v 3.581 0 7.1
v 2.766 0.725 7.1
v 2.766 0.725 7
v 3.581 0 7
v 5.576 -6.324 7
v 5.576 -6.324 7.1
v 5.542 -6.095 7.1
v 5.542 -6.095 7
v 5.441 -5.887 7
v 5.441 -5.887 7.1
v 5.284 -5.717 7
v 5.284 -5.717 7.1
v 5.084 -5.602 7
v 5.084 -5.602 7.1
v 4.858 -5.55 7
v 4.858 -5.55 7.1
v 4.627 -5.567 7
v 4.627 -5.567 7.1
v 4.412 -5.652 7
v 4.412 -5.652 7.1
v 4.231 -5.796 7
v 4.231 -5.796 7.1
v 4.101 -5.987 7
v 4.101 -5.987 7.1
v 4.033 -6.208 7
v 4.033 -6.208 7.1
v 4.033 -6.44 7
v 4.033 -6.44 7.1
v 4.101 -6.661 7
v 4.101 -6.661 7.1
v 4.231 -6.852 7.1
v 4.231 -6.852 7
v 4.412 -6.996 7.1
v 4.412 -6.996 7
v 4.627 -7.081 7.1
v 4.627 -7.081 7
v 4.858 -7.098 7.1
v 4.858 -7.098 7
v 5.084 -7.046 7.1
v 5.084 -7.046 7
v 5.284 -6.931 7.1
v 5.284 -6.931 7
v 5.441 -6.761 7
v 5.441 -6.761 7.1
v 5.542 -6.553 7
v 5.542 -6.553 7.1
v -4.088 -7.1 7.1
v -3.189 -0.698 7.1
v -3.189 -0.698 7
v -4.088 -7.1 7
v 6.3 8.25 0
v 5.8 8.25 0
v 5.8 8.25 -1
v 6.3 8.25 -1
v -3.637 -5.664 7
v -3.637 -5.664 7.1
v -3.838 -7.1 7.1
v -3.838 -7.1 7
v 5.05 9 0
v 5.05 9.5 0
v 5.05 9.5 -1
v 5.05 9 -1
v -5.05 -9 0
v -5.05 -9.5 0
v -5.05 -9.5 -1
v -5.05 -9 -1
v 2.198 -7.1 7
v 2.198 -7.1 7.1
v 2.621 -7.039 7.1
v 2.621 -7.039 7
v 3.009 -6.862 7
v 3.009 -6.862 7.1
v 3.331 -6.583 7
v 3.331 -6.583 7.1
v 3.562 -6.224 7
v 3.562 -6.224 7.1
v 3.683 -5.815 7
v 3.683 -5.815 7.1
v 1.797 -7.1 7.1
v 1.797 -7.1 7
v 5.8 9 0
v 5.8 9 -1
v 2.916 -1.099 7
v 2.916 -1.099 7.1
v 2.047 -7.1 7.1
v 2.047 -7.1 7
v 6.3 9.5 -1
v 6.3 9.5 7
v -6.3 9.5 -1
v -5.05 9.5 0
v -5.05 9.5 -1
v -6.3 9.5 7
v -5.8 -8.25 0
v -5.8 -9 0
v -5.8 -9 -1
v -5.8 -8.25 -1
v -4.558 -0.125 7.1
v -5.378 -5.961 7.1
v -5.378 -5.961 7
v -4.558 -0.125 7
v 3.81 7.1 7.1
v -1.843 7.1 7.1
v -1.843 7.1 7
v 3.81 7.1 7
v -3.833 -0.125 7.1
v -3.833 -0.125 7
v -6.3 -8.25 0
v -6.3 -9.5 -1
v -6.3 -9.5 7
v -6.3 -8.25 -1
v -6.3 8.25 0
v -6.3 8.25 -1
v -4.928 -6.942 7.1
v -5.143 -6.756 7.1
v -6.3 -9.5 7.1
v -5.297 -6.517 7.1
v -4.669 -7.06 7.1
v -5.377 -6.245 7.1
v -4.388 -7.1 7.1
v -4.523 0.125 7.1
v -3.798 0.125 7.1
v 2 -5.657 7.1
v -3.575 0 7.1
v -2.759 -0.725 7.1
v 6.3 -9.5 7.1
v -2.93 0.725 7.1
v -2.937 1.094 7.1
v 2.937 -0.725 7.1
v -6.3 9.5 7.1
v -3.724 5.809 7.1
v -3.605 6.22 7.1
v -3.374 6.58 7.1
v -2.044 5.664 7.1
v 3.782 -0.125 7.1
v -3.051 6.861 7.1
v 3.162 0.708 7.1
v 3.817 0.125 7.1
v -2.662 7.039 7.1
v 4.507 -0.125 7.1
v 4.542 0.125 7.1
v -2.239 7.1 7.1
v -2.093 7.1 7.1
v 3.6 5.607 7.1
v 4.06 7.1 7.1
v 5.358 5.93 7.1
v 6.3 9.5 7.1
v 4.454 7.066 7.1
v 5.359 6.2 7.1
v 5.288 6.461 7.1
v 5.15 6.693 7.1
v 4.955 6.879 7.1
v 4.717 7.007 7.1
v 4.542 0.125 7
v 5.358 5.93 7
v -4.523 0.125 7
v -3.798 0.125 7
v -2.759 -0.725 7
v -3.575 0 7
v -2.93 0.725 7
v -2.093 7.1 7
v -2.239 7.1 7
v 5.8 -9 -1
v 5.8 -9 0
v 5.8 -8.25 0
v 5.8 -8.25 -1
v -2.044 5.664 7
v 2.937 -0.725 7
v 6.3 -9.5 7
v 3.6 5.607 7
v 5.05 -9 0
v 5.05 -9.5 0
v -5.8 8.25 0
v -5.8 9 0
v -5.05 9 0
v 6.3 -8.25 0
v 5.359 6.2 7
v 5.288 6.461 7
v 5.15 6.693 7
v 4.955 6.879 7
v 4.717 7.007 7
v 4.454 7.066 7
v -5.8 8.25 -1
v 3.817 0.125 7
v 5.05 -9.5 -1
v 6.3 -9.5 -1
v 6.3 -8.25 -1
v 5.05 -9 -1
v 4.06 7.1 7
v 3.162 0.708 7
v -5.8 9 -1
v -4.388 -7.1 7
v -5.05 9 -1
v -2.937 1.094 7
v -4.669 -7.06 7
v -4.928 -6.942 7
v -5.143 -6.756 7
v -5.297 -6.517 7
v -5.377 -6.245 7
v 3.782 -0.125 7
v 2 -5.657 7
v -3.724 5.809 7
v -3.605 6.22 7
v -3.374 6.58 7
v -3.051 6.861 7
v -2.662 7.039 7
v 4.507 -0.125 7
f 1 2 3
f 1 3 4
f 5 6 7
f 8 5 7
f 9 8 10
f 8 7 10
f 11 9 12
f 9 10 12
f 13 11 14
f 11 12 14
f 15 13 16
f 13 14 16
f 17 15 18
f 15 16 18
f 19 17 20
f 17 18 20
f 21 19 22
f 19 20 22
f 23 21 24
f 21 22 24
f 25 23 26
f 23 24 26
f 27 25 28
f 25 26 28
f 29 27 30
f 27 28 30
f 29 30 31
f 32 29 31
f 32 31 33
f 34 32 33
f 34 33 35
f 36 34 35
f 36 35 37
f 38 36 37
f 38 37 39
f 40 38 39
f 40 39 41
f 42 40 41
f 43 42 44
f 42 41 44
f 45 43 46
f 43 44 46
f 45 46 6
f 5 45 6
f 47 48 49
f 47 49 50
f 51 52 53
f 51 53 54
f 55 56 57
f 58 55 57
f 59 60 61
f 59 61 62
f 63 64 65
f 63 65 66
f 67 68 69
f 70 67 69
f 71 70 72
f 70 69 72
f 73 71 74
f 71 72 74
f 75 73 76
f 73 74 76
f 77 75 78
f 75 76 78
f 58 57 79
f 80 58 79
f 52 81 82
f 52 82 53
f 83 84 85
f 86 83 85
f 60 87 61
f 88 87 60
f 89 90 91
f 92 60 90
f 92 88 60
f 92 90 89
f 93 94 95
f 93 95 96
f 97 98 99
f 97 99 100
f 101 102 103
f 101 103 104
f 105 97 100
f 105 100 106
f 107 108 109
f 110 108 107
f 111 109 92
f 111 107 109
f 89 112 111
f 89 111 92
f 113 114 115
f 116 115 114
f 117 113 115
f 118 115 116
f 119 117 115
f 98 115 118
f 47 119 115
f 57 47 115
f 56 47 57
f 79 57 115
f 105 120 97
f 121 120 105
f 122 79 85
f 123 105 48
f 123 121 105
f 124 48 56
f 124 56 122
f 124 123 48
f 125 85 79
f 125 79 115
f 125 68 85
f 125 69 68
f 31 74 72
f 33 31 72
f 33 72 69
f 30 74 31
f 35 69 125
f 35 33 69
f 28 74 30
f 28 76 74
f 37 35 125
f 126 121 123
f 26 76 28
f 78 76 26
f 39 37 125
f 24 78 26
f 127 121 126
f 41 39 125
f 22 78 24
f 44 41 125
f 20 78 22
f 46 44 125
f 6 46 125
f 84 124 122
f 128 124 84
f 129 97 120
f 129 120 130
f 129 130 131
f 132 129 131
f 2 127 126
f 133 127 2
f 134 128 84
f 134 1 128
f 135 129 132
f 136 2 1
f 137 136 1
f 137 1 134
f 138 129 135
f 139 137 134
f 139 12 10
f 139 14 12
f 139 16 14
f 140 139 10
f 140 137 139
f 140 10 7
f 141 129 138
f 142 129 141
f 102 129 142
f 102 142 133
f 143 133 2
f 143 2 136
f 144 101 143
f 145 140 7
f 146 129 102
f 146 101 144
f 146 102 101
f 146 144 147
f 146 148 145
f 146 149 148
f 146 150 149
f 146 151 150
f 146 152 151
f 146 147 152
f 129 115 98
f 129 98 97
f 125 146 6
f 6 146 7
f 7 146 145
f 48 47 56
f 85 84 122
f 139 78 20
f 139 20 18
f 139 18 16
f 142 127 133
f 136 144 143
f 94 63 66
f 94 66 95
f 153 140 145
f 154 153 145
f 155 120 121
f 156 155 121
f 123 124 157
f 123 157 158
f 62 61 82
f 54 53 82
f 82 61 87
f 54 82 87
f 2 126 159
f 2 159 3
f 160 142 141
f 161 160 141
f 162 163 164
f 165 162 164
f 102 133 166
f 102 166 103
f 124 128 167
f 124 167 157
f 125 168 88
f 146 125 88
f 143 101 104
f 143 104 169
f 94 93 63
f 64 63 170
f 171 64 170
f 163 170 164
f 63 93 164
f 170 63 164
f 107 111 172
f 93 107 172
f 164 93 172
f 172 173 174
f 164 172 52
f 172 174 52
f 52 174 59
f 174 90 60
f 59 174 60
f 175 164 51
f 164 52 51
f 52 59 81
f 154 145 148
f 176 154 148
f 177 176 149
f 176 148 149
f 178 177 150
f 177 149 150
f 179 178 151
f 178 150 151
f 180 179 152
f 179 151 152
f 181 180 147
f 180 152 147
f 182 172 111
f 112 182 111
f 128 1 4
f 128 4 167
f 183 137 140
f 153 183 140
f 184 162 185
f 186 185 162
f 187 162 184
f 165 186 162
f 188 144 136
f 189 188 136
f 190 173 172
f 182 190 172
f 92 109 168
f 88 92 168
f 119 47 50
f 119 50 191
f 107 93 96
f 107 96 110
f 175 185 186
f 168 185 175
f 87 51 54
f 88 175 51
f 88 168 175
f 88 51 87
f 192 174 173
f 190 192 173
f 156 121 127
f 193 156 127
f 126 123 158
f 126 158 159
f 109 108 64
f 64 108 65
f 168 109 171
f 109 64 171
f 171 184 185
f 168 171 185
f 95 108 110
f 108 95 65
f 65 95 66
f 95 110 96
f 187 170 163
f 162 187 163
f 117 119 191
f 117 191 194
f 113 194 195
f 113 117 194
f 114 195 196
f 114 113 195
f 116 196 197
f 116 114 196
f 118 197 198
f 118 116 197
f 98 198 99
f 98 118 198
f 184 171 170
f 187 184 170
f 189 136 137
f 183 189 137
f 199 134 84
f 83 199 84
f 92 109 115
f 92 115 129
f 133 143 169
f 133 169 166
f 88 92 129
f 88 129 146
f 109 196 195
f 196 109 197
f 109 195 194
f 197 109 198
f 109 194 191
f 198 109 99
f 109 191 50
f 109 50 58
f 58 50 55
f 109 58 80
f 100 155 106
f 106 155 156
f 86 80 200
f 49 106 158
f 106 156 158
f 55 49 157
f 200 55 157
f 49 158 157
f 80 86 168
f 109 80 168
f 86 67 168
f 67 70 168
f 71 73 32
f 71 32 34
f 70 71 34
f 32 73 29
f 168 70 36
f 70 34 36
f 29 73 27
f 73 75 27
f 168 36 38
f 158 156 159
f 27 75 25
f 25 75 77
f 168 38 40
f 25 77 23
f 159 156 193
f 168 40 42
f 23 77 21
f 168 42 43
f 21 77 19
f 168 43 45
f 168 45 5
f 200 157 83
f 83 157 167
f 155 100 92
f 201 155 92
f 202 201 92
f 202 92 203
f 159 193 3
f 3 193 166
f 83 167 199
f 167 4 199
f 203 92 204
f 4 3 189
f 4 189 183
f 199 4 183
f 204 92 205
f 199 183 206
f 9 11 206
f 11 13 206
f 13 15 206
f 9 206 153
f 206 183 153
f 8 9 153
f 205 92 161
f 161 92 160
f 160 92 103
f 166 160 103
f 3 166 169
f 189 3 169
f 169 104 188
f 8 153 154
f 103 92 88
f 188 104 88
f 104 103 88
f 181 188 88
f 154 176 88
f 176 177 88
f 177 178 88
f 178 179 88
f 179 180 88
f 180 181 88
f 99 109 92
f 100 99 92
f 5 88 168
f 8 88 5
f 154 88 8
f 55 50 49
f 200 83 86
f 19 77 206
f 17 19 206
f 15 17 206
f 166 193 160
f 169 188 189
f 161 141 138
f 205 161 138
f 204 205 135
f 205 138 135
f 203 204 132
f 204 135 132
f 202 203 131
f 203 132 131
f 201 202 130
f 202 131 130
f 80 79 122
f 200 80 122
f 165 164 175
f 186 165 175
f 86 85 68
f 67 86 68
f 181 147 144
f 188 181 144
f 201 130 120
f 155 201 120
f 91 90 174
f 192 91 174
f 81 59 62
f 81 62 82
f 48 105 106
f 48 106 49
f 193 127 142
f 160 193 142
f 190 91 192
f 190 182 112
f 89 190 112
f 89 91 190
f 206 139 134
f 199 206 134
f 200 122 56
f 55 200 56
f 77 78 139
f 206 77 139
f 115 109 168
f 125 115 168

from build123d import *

# Parameters (mm, degrees)
SKETCH1_W           = 12.6
SKETCH1_H           = 19
BOSS_EXTRUDE1_DEPTH = 7
BOSS_EXTRUDE2_DEPTH = 1
SKETCH3_W           = 12.6
SKETCH3_H           = 19
BOSS_EXTRUDE3_DEPTH = 0.1
SKETCH4_R           = 0.776012873
CUT_EXTRUDE1_DEPTH  = 0.1


with BuildPart() as part:
    # Sketch1 → Boss-Extrude1 (new body)
    with BuildSketch(Plane.XY):
        Rectangle(SKETCH1_W, SKETCH1_H)
    extrude(amount=BOSS_EXTRUDE1_DEPTH)

    # Sketch2 → Boss-Extrude2 (add)
    with BuildSketch(Plane(origin=(0, 0, 0), x_dir=(-1, 0, 0), z_dir=(0, 0, -1))):
        Polygon((-6.3, 9.5), (-5.05, 9.5), (-5.05, 9), (-5.8, 9), (-5.8, 8.25), (-6.3, 8.25), align=None)
        Polygon((5.05, 9.5), (5.05, 9), (5.8, 9), (5.8, 8.25), (6.3, 8.25), (6.3, 9.5), align=None)
        Polygon((6.3, -8.25), (6.3, -9.5), (5.05, -9.5), (5.05, -9), (5.8, -9), (5.8, -8.25), align=None)
        Polygon((-5.05, -9.5), (-5.05, -9), (-5.8, -9), (-5.8, -8.25), (-6.3, -8.25), (-6.3, -9.5), align=None)
    extrude(amount=BOSS_EXTRUDE2_DEPTH)


with BuildPart() as body_2:
    # Sketch3 → Boss-Extrude3 (new body)
    with BuildSketch(Plane.XY.offset(7)):
        Rectangle(SKETCH3_W, SKETCH3_H)
    extrude(amount=BOSS_EXTRUDE3_DEPTH)

    # Sketch4 → Cut-Extrude1 (cut)
    with BuildSketch(Plane.XY.offset(7.1)):
        with Locations((4.8, -6.323987127)):
            Circle(SKETCH4_R)
        Polygon((-1.842687024, 7.1), (3.809991471, 7.1), (3.600153471, 5.606925049), (-2.04448802, 5.6641113), align=None)
        with BuildLine():
            Line((-3.72415902, 5.808759651), (-4.522959346, 0.125))
            Line((-4.522959346, 0.125), (-3.797959346, 0.125))
            Line((-3.797959346, 0.125), (-2.936837994, 1.093553748))
            Line((-2.936837994, 1.093553748), (-2.092687024, 7.1))
            Line((-2.092687024, 7.1), (-2.238756917, 7.1))
            ThreePointArc((-2.238756917, 7.1), (-3.222845461, 6.73206437), (-3.72415902, 5.808759651))
        make_face()
        with BuildLine():
            Line((-5.378266538, -5.960826899), (-4.558094555, -0.125))
            Line((-4.558094555, -0.125), (-3.833094555, -0.125))
            Line((-3.833094555, -0.125), (-3.188622604, -0.697986846))
            Line((-3.188622604, -0.697986846), (-4.088366877, -7.1))
            Line((-4.088366877, -7.1), (-4.38799847, -7.1))
            ThreePointArc((-4.38799847, -7.1), (-5.14270805, -6.756059029), (-5.378266538, -5.960826899))
        make_face()
        with BuildLine():
            Line((4.453734529, 7.065929798), (4.059991471, 7.1))
            Line((4.059991471, 7.1), (3.161598917, 0.707604826))
            Line((3.161598917, 0.707604826), (3.816888774, 0.125))
            Line((3.816888774, 0.125), (4.541888774, 0.125))
            Line((4.541888774, 0.125), (5.357795701, 5.930479441))
            ThreePointArc((5.357795701, 5.930479441), (5.149839249, 6.692539798), (4.453734529, 7.065929798))
        make_face()
        with BuildLine():
            Line((2.04682864, -7.1), (2.198374788, -7.1))
            ThreePointArc((2.198374788, -7.1), (3.180102847, -6.734111995), (3.682894212, -5.814946691))
            Line((3.682894212, -5.814946691), (4.506753566, -0.125))
            Line((4.506753566, -0.125), (3.781753566, -0.125))
            Line((3.781753566, -0.125), (2.915713605, -1.099085996))
            Line((2.915713605, -1.099085996), (2.04682864, -7.1))
        make_face()
        Polygon((-2.929991192, 0.725), (2.765778795, 0.725), (3.581228865, 0), (2.936646175, -0.725), (-2.759123811, -0.725), (-3.574573882, 0), align=None)
        Polygon((-3.838366877, -7.1), (1.79682864, -7.1), (1.9996392, -5.656927882), (-3.63656588, -5.6641113), align=None)
    extrude(amount=-CUT_EXTRUDE1_DEPTH, mode=Mode.SUBTRACT)


solid = Compound([part.part, body_2.part])
